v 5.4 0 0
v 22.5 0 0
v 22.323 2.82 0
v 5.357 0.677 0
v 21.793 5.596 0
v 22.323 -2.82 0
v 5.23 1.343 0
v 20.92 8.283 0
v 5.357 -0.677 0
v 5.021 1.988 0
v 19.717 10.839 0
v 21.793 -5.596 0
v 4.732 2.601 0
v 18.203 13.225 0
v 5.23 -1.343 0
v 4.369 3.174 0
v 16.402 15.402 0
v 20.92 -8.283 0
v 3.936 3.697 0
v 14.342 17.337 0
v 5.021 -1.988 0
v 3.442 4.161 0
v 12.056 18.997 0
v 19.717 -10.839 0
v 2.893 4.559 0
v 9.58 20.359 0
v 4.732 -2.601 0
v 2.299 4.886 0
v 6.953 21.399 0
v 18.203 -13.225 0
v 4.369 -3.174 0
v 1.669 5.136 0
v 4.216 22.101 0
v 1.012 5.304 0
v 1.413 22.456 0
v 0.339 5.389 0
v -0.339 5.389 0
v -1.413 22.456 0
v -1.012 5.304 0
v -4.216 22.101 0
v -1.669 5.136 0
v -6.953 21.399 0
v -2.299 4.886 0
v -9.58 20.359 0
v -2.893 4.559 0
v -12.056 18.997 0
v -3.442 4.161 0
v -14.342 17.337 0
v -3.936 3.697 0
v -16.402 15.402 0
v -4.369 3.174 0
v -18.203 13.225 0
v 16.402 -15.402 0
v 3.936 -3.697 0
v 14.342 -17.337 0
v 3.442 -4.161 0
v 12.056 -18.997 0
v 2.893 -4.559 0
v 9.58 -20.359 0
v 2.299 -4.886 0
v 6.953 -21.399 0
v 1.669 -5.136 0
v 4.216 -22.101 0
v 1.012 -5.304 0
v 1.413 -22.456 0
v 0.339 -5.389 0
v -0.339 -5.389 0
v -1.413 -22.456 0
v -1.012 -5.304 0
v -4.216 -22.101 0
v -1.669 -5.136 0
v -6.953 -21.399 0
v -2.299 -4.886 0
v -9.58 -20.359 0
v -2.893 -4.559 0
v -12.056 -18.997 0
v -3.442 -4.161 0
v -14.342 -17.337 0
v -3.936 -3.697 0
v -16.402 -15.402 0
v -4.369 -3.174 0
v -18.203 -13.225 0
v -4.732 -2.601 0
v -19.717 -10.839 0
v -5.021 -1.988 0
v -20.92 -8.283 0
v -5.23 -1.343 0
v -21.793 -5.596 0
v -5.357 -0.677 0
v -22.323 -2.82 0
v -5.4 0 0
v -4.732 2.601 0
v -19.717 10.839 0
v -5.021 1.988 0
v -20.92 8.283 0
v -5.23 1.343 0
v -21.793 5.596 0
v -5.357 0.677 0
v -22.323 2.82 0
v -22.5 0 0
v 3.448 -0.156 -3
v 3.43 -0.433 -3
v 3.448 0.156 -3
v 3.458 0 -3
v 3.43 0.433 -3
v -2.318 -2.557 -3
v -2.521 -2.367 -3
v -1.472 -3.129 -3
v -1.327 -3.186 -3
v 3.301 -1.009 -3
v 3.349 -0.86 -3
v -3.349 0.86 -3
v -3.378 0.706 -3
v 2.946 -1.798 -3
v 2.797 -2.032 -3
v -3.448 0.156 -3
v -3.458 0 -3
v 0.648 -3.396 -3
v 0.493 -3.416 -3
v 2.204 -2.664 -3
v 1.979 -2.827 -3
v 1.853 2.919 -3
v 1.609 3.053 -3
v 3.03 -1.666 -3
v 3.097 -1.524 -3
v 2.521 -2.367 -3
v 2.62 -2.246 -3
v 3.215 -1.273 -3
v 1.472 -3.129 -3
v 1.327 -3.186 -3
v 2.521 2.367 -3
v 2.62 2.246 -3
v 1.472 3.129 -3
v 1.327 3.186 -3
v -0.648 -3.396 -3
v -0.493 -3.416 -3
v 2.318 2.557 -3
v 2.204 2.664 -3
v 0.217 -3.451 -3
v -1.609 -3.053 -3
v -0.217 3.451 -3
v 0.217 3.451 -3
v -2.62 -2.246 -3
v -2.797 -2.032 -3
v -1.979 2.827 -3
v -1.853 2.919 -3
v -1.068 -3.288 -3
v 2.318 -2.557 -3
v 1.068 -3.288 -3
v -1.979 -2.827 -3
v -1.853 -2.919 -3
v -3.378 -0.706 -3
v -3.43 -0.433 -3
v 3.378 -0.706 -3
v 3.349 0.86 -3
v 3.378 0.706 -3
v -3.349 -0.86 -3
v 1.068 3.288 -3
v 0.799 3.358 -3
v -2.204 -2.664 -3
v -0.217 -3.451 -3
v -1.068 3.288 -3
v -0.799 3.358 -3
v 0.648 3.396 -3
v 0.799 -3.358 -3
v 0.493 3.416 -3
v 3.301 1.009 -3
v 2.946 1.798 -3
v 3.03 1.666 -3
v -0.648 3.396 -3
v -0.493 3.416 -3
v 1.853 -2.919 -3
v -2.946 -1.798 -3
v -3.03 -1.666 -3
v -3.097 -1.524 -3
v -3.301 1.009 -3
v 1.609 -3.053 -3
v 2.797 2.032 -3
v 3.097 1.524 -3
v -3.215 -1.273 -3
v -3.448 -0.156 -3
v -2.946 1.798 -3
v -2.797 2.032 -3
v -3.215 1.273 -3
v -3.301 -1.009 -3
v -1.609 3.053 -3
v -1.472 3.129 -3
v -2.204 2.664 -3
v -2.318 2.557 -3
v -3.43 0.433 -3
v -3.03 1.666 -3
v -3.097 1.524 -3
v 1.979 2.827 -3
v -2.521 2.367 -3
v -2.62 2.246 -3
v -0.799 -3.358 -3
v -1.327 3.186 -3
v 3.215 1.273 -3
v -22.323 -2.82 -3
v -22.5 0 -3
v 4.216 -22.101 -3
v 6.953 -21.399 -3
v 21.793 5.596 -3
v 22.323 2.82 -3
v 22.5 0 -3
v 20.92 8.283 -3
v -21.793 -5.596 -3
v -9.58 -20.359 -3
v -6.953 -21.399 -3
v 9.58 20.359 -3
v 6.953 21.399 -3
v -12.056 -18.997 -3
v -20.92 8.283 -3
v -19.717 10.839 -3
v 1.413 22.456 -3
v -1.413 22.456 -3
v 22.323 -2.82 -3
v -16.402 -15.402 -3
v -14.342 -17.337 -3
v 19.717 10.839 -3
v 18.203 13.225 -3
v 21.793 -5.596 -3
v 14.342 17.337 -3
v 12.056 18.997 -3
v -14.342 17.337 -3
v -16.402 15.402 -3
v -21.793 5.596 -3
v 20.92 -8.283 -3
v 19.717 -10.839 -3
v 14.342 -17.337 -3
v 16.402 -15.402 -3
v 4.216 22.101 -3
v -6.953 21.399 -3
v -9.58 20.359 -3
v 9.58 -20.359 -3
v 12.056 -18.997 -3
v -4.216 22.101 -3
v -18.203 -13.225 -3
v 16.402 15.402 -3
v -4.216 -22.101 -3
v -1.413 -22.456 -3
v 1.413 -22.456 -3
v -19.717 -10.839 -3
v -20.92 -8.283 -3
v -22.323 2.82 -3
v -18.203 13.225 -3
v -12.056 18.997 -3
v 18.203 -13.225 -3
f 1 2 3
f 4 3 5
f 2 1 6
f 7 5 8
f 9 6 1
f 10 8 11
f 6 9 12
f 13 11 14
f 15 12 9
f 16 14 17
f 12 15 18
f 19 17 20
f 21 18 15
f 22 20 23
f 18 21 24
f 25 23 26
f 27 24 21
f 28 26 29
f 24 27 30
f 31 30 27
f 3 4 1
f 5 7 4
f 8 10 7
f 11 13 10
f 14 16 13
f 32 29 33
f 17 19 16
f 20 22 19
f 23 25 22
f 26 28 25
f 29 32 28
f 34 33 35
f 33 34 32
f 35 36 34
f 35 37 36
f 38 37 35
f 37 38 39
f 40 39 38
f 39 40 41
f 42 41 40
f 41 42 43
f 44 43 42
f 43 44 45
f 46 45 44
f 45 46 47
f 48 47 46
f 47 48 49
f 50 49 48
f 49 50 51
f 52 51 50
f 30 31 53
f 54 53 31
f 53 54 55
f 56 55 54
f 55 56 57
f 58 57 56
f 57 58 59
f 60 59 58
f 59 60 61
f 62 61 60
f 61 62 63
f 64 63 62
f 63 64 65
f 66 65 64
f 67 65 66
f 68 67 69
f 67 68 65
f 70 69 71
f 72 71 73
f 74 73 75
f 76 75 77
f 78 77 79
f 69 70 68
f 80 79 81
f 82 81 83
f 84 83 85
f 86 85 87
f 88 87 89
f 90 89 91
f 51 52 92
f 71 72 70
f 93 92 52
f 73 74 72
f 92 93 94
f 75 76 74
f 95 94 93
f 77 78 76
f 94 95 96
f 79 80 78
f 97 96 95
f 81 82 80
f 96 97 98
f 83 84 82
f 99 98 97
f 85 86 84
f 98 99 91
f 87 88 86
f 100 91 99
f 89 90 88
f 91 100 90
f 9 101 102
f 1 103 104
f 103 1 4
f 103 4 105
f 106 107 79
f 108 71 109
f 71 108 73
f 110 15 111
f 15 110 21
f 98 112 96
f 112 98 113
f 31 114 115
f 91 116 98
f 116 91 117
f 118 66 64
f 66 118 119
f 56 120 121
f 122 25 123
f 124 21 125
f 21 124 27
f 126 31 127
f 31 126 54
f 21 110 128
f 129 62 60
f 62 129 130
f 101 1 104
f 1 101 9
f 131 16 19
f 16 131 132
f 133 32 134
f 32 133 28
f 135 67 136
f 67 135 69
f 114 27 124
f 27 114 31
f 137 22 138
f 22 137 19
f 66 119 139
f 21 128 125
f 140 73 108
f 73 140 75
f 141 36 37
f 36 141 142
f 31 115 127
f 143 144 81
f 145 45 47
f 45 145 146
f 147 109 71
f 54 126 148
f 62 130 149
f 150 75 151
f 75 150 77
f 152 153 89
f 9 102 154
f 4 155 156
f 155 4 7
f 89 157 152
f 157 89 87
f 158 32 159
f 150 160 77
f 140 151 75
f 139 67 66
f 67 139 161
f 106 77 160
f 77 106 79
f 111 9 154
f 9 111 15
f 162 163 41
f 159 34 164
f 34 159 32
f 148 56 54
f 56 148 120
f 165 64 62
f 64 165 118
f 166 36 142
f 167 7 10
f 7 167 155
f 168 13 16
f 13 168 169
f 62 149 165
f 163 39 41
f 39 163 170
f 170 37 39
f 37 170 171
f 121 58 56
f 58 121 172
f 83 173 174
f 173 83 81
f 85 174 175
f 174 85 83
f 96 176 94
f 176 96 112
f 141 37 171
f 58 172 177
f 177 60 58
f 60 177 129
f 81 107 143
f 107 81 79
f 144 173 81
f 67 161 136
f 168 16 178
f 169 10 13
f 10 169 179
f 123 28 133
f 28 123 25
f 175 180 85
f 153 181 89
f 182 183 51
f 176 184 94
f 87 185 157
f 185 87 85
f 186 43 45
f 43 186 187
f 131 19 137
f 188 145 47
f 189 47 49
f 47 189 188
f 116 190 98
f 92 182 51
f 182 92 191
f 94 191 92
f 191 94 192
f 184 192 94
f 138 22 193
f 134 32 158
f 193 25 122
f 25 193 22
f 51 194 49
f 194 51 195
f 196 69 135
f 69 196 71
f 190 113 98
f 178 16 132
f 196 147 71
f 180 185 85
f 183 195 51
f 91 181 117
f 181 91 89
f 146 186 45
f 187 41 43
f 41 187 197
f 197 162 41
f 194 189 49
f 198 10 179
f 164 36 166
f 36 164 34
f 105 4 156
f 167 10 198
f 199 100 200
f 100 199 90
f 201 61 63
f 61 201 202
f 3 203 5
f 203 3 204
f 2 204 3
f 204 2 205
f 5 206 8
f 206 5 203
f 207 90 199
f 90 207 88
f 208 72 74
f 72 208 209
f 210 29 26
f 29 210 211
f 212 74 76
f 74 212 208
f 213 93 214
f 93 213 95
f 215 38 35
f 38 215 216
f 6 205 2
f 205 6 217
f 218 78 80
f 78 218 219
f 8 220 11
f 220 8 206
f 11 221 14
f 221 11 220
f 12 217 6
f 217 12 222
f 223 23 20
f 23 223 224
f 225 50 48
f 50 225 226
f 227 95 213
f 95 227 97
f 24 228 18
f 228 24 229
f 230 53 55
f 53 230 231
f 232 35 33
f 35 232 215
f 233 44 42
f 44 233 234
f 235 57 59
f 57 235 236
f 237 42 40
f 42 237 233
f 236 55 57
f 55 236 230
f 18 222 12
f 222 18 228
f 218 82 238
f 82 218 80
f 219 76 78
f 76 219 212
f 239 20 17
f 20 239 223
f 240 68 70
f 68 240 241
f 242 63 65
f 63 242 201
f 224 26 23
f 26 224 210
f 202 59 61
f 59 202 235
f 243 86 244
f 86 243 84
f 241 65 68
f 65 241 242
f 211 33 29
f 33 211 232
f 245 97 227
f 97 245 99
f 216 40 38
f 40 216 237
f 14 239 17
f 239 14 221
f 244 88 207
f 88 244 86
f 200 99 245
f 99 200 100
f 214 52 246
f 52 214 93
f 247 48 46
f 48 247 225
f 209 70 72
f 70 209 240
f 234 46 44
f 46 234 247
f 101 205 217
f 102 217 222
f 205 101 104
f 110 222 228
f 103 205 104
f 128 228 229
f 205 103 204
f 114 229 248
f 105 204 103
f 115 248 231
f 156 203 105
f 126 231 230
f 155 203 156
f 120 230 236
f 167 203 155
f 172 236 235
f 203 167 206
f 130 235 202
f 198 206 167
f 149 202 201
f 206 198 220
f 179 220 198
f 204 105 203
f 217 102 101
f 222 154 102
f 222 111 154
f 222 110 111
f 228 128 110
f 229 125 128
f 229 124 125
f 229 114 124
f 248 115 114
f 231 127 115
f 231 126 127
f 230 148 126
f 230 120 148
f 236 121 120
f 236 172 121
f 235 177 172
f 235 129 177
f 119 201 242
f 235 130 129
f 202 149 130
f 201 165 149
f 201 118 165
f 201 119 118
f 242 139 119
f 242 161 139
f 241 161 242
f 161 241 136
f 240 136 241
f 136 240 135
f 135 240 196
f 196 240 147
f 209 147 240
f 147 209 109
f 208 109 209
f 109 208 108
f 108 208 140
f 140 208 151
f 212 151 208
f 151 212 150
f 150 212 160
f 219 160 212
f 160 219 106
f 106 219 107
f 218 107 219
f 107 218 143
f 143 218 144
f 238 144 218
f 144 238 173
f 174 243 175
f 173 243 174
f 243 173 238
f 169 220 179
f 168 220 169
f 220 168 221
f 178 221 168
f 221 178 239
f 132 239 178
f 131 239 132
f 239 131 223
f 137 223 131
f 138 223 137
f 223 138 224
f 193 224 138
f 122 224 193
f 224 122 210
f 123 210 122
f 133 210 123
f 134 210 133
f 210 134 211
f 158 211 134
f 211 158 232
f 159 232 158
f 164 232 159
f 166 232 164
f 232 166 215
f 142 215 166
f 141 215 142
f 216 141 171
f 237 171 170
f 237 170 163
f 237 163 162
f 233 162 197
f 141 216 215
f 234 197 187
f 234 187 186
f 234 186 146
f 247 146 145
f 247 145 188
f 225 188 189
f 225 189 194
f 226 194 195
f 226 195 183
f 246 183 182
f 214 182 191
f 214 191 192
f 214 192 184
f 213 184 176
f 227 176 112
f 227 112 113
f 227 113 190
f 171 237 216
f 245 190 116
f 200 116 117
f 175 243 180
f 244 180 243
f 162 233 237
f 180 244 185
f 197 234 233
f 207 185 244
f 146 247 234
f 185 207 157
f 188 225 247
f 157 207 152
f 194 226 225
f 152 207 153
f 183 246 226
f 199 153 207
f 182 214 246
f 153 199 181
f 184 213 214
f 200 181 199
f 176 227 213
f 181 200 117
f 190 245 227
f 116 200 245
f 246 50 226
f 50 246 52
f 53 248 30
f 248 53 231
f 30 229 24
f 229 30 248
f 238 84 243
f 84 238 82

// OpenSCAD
$fn = 50;


difference() {
	union() {
		translate(v = [0, 0, -3.0000000000]) {
			cylinder(h = 3, r = 22.5000000000);
		}
	}
	union() {
		translate(v = [0, 0, 0]) {
			rotate(a = [0, 0, 0]) {
				difference() {
					union() {
						translate(v = [0, 0, -3.0000000000]) {
							cylinder(h = 3, r = 2.6000000000);
						}
						translate(v = [0, 0, -3.9000000000]) {
							cylinder(h = 3.9000000000, r1 = 2.8750000000, r2 = 5.4000000000);
						}
						translate(v = [0, 0, -3.0000000000]) {
							cylinder(h = 3, r = 2.8750000000);
						}
						translate(v = [0, 0, -3.0000000000]) {
							cylinder(h = 3, r = 2.6000000000);
						}
					}
					union();
				}
			}
		}
	}
}
